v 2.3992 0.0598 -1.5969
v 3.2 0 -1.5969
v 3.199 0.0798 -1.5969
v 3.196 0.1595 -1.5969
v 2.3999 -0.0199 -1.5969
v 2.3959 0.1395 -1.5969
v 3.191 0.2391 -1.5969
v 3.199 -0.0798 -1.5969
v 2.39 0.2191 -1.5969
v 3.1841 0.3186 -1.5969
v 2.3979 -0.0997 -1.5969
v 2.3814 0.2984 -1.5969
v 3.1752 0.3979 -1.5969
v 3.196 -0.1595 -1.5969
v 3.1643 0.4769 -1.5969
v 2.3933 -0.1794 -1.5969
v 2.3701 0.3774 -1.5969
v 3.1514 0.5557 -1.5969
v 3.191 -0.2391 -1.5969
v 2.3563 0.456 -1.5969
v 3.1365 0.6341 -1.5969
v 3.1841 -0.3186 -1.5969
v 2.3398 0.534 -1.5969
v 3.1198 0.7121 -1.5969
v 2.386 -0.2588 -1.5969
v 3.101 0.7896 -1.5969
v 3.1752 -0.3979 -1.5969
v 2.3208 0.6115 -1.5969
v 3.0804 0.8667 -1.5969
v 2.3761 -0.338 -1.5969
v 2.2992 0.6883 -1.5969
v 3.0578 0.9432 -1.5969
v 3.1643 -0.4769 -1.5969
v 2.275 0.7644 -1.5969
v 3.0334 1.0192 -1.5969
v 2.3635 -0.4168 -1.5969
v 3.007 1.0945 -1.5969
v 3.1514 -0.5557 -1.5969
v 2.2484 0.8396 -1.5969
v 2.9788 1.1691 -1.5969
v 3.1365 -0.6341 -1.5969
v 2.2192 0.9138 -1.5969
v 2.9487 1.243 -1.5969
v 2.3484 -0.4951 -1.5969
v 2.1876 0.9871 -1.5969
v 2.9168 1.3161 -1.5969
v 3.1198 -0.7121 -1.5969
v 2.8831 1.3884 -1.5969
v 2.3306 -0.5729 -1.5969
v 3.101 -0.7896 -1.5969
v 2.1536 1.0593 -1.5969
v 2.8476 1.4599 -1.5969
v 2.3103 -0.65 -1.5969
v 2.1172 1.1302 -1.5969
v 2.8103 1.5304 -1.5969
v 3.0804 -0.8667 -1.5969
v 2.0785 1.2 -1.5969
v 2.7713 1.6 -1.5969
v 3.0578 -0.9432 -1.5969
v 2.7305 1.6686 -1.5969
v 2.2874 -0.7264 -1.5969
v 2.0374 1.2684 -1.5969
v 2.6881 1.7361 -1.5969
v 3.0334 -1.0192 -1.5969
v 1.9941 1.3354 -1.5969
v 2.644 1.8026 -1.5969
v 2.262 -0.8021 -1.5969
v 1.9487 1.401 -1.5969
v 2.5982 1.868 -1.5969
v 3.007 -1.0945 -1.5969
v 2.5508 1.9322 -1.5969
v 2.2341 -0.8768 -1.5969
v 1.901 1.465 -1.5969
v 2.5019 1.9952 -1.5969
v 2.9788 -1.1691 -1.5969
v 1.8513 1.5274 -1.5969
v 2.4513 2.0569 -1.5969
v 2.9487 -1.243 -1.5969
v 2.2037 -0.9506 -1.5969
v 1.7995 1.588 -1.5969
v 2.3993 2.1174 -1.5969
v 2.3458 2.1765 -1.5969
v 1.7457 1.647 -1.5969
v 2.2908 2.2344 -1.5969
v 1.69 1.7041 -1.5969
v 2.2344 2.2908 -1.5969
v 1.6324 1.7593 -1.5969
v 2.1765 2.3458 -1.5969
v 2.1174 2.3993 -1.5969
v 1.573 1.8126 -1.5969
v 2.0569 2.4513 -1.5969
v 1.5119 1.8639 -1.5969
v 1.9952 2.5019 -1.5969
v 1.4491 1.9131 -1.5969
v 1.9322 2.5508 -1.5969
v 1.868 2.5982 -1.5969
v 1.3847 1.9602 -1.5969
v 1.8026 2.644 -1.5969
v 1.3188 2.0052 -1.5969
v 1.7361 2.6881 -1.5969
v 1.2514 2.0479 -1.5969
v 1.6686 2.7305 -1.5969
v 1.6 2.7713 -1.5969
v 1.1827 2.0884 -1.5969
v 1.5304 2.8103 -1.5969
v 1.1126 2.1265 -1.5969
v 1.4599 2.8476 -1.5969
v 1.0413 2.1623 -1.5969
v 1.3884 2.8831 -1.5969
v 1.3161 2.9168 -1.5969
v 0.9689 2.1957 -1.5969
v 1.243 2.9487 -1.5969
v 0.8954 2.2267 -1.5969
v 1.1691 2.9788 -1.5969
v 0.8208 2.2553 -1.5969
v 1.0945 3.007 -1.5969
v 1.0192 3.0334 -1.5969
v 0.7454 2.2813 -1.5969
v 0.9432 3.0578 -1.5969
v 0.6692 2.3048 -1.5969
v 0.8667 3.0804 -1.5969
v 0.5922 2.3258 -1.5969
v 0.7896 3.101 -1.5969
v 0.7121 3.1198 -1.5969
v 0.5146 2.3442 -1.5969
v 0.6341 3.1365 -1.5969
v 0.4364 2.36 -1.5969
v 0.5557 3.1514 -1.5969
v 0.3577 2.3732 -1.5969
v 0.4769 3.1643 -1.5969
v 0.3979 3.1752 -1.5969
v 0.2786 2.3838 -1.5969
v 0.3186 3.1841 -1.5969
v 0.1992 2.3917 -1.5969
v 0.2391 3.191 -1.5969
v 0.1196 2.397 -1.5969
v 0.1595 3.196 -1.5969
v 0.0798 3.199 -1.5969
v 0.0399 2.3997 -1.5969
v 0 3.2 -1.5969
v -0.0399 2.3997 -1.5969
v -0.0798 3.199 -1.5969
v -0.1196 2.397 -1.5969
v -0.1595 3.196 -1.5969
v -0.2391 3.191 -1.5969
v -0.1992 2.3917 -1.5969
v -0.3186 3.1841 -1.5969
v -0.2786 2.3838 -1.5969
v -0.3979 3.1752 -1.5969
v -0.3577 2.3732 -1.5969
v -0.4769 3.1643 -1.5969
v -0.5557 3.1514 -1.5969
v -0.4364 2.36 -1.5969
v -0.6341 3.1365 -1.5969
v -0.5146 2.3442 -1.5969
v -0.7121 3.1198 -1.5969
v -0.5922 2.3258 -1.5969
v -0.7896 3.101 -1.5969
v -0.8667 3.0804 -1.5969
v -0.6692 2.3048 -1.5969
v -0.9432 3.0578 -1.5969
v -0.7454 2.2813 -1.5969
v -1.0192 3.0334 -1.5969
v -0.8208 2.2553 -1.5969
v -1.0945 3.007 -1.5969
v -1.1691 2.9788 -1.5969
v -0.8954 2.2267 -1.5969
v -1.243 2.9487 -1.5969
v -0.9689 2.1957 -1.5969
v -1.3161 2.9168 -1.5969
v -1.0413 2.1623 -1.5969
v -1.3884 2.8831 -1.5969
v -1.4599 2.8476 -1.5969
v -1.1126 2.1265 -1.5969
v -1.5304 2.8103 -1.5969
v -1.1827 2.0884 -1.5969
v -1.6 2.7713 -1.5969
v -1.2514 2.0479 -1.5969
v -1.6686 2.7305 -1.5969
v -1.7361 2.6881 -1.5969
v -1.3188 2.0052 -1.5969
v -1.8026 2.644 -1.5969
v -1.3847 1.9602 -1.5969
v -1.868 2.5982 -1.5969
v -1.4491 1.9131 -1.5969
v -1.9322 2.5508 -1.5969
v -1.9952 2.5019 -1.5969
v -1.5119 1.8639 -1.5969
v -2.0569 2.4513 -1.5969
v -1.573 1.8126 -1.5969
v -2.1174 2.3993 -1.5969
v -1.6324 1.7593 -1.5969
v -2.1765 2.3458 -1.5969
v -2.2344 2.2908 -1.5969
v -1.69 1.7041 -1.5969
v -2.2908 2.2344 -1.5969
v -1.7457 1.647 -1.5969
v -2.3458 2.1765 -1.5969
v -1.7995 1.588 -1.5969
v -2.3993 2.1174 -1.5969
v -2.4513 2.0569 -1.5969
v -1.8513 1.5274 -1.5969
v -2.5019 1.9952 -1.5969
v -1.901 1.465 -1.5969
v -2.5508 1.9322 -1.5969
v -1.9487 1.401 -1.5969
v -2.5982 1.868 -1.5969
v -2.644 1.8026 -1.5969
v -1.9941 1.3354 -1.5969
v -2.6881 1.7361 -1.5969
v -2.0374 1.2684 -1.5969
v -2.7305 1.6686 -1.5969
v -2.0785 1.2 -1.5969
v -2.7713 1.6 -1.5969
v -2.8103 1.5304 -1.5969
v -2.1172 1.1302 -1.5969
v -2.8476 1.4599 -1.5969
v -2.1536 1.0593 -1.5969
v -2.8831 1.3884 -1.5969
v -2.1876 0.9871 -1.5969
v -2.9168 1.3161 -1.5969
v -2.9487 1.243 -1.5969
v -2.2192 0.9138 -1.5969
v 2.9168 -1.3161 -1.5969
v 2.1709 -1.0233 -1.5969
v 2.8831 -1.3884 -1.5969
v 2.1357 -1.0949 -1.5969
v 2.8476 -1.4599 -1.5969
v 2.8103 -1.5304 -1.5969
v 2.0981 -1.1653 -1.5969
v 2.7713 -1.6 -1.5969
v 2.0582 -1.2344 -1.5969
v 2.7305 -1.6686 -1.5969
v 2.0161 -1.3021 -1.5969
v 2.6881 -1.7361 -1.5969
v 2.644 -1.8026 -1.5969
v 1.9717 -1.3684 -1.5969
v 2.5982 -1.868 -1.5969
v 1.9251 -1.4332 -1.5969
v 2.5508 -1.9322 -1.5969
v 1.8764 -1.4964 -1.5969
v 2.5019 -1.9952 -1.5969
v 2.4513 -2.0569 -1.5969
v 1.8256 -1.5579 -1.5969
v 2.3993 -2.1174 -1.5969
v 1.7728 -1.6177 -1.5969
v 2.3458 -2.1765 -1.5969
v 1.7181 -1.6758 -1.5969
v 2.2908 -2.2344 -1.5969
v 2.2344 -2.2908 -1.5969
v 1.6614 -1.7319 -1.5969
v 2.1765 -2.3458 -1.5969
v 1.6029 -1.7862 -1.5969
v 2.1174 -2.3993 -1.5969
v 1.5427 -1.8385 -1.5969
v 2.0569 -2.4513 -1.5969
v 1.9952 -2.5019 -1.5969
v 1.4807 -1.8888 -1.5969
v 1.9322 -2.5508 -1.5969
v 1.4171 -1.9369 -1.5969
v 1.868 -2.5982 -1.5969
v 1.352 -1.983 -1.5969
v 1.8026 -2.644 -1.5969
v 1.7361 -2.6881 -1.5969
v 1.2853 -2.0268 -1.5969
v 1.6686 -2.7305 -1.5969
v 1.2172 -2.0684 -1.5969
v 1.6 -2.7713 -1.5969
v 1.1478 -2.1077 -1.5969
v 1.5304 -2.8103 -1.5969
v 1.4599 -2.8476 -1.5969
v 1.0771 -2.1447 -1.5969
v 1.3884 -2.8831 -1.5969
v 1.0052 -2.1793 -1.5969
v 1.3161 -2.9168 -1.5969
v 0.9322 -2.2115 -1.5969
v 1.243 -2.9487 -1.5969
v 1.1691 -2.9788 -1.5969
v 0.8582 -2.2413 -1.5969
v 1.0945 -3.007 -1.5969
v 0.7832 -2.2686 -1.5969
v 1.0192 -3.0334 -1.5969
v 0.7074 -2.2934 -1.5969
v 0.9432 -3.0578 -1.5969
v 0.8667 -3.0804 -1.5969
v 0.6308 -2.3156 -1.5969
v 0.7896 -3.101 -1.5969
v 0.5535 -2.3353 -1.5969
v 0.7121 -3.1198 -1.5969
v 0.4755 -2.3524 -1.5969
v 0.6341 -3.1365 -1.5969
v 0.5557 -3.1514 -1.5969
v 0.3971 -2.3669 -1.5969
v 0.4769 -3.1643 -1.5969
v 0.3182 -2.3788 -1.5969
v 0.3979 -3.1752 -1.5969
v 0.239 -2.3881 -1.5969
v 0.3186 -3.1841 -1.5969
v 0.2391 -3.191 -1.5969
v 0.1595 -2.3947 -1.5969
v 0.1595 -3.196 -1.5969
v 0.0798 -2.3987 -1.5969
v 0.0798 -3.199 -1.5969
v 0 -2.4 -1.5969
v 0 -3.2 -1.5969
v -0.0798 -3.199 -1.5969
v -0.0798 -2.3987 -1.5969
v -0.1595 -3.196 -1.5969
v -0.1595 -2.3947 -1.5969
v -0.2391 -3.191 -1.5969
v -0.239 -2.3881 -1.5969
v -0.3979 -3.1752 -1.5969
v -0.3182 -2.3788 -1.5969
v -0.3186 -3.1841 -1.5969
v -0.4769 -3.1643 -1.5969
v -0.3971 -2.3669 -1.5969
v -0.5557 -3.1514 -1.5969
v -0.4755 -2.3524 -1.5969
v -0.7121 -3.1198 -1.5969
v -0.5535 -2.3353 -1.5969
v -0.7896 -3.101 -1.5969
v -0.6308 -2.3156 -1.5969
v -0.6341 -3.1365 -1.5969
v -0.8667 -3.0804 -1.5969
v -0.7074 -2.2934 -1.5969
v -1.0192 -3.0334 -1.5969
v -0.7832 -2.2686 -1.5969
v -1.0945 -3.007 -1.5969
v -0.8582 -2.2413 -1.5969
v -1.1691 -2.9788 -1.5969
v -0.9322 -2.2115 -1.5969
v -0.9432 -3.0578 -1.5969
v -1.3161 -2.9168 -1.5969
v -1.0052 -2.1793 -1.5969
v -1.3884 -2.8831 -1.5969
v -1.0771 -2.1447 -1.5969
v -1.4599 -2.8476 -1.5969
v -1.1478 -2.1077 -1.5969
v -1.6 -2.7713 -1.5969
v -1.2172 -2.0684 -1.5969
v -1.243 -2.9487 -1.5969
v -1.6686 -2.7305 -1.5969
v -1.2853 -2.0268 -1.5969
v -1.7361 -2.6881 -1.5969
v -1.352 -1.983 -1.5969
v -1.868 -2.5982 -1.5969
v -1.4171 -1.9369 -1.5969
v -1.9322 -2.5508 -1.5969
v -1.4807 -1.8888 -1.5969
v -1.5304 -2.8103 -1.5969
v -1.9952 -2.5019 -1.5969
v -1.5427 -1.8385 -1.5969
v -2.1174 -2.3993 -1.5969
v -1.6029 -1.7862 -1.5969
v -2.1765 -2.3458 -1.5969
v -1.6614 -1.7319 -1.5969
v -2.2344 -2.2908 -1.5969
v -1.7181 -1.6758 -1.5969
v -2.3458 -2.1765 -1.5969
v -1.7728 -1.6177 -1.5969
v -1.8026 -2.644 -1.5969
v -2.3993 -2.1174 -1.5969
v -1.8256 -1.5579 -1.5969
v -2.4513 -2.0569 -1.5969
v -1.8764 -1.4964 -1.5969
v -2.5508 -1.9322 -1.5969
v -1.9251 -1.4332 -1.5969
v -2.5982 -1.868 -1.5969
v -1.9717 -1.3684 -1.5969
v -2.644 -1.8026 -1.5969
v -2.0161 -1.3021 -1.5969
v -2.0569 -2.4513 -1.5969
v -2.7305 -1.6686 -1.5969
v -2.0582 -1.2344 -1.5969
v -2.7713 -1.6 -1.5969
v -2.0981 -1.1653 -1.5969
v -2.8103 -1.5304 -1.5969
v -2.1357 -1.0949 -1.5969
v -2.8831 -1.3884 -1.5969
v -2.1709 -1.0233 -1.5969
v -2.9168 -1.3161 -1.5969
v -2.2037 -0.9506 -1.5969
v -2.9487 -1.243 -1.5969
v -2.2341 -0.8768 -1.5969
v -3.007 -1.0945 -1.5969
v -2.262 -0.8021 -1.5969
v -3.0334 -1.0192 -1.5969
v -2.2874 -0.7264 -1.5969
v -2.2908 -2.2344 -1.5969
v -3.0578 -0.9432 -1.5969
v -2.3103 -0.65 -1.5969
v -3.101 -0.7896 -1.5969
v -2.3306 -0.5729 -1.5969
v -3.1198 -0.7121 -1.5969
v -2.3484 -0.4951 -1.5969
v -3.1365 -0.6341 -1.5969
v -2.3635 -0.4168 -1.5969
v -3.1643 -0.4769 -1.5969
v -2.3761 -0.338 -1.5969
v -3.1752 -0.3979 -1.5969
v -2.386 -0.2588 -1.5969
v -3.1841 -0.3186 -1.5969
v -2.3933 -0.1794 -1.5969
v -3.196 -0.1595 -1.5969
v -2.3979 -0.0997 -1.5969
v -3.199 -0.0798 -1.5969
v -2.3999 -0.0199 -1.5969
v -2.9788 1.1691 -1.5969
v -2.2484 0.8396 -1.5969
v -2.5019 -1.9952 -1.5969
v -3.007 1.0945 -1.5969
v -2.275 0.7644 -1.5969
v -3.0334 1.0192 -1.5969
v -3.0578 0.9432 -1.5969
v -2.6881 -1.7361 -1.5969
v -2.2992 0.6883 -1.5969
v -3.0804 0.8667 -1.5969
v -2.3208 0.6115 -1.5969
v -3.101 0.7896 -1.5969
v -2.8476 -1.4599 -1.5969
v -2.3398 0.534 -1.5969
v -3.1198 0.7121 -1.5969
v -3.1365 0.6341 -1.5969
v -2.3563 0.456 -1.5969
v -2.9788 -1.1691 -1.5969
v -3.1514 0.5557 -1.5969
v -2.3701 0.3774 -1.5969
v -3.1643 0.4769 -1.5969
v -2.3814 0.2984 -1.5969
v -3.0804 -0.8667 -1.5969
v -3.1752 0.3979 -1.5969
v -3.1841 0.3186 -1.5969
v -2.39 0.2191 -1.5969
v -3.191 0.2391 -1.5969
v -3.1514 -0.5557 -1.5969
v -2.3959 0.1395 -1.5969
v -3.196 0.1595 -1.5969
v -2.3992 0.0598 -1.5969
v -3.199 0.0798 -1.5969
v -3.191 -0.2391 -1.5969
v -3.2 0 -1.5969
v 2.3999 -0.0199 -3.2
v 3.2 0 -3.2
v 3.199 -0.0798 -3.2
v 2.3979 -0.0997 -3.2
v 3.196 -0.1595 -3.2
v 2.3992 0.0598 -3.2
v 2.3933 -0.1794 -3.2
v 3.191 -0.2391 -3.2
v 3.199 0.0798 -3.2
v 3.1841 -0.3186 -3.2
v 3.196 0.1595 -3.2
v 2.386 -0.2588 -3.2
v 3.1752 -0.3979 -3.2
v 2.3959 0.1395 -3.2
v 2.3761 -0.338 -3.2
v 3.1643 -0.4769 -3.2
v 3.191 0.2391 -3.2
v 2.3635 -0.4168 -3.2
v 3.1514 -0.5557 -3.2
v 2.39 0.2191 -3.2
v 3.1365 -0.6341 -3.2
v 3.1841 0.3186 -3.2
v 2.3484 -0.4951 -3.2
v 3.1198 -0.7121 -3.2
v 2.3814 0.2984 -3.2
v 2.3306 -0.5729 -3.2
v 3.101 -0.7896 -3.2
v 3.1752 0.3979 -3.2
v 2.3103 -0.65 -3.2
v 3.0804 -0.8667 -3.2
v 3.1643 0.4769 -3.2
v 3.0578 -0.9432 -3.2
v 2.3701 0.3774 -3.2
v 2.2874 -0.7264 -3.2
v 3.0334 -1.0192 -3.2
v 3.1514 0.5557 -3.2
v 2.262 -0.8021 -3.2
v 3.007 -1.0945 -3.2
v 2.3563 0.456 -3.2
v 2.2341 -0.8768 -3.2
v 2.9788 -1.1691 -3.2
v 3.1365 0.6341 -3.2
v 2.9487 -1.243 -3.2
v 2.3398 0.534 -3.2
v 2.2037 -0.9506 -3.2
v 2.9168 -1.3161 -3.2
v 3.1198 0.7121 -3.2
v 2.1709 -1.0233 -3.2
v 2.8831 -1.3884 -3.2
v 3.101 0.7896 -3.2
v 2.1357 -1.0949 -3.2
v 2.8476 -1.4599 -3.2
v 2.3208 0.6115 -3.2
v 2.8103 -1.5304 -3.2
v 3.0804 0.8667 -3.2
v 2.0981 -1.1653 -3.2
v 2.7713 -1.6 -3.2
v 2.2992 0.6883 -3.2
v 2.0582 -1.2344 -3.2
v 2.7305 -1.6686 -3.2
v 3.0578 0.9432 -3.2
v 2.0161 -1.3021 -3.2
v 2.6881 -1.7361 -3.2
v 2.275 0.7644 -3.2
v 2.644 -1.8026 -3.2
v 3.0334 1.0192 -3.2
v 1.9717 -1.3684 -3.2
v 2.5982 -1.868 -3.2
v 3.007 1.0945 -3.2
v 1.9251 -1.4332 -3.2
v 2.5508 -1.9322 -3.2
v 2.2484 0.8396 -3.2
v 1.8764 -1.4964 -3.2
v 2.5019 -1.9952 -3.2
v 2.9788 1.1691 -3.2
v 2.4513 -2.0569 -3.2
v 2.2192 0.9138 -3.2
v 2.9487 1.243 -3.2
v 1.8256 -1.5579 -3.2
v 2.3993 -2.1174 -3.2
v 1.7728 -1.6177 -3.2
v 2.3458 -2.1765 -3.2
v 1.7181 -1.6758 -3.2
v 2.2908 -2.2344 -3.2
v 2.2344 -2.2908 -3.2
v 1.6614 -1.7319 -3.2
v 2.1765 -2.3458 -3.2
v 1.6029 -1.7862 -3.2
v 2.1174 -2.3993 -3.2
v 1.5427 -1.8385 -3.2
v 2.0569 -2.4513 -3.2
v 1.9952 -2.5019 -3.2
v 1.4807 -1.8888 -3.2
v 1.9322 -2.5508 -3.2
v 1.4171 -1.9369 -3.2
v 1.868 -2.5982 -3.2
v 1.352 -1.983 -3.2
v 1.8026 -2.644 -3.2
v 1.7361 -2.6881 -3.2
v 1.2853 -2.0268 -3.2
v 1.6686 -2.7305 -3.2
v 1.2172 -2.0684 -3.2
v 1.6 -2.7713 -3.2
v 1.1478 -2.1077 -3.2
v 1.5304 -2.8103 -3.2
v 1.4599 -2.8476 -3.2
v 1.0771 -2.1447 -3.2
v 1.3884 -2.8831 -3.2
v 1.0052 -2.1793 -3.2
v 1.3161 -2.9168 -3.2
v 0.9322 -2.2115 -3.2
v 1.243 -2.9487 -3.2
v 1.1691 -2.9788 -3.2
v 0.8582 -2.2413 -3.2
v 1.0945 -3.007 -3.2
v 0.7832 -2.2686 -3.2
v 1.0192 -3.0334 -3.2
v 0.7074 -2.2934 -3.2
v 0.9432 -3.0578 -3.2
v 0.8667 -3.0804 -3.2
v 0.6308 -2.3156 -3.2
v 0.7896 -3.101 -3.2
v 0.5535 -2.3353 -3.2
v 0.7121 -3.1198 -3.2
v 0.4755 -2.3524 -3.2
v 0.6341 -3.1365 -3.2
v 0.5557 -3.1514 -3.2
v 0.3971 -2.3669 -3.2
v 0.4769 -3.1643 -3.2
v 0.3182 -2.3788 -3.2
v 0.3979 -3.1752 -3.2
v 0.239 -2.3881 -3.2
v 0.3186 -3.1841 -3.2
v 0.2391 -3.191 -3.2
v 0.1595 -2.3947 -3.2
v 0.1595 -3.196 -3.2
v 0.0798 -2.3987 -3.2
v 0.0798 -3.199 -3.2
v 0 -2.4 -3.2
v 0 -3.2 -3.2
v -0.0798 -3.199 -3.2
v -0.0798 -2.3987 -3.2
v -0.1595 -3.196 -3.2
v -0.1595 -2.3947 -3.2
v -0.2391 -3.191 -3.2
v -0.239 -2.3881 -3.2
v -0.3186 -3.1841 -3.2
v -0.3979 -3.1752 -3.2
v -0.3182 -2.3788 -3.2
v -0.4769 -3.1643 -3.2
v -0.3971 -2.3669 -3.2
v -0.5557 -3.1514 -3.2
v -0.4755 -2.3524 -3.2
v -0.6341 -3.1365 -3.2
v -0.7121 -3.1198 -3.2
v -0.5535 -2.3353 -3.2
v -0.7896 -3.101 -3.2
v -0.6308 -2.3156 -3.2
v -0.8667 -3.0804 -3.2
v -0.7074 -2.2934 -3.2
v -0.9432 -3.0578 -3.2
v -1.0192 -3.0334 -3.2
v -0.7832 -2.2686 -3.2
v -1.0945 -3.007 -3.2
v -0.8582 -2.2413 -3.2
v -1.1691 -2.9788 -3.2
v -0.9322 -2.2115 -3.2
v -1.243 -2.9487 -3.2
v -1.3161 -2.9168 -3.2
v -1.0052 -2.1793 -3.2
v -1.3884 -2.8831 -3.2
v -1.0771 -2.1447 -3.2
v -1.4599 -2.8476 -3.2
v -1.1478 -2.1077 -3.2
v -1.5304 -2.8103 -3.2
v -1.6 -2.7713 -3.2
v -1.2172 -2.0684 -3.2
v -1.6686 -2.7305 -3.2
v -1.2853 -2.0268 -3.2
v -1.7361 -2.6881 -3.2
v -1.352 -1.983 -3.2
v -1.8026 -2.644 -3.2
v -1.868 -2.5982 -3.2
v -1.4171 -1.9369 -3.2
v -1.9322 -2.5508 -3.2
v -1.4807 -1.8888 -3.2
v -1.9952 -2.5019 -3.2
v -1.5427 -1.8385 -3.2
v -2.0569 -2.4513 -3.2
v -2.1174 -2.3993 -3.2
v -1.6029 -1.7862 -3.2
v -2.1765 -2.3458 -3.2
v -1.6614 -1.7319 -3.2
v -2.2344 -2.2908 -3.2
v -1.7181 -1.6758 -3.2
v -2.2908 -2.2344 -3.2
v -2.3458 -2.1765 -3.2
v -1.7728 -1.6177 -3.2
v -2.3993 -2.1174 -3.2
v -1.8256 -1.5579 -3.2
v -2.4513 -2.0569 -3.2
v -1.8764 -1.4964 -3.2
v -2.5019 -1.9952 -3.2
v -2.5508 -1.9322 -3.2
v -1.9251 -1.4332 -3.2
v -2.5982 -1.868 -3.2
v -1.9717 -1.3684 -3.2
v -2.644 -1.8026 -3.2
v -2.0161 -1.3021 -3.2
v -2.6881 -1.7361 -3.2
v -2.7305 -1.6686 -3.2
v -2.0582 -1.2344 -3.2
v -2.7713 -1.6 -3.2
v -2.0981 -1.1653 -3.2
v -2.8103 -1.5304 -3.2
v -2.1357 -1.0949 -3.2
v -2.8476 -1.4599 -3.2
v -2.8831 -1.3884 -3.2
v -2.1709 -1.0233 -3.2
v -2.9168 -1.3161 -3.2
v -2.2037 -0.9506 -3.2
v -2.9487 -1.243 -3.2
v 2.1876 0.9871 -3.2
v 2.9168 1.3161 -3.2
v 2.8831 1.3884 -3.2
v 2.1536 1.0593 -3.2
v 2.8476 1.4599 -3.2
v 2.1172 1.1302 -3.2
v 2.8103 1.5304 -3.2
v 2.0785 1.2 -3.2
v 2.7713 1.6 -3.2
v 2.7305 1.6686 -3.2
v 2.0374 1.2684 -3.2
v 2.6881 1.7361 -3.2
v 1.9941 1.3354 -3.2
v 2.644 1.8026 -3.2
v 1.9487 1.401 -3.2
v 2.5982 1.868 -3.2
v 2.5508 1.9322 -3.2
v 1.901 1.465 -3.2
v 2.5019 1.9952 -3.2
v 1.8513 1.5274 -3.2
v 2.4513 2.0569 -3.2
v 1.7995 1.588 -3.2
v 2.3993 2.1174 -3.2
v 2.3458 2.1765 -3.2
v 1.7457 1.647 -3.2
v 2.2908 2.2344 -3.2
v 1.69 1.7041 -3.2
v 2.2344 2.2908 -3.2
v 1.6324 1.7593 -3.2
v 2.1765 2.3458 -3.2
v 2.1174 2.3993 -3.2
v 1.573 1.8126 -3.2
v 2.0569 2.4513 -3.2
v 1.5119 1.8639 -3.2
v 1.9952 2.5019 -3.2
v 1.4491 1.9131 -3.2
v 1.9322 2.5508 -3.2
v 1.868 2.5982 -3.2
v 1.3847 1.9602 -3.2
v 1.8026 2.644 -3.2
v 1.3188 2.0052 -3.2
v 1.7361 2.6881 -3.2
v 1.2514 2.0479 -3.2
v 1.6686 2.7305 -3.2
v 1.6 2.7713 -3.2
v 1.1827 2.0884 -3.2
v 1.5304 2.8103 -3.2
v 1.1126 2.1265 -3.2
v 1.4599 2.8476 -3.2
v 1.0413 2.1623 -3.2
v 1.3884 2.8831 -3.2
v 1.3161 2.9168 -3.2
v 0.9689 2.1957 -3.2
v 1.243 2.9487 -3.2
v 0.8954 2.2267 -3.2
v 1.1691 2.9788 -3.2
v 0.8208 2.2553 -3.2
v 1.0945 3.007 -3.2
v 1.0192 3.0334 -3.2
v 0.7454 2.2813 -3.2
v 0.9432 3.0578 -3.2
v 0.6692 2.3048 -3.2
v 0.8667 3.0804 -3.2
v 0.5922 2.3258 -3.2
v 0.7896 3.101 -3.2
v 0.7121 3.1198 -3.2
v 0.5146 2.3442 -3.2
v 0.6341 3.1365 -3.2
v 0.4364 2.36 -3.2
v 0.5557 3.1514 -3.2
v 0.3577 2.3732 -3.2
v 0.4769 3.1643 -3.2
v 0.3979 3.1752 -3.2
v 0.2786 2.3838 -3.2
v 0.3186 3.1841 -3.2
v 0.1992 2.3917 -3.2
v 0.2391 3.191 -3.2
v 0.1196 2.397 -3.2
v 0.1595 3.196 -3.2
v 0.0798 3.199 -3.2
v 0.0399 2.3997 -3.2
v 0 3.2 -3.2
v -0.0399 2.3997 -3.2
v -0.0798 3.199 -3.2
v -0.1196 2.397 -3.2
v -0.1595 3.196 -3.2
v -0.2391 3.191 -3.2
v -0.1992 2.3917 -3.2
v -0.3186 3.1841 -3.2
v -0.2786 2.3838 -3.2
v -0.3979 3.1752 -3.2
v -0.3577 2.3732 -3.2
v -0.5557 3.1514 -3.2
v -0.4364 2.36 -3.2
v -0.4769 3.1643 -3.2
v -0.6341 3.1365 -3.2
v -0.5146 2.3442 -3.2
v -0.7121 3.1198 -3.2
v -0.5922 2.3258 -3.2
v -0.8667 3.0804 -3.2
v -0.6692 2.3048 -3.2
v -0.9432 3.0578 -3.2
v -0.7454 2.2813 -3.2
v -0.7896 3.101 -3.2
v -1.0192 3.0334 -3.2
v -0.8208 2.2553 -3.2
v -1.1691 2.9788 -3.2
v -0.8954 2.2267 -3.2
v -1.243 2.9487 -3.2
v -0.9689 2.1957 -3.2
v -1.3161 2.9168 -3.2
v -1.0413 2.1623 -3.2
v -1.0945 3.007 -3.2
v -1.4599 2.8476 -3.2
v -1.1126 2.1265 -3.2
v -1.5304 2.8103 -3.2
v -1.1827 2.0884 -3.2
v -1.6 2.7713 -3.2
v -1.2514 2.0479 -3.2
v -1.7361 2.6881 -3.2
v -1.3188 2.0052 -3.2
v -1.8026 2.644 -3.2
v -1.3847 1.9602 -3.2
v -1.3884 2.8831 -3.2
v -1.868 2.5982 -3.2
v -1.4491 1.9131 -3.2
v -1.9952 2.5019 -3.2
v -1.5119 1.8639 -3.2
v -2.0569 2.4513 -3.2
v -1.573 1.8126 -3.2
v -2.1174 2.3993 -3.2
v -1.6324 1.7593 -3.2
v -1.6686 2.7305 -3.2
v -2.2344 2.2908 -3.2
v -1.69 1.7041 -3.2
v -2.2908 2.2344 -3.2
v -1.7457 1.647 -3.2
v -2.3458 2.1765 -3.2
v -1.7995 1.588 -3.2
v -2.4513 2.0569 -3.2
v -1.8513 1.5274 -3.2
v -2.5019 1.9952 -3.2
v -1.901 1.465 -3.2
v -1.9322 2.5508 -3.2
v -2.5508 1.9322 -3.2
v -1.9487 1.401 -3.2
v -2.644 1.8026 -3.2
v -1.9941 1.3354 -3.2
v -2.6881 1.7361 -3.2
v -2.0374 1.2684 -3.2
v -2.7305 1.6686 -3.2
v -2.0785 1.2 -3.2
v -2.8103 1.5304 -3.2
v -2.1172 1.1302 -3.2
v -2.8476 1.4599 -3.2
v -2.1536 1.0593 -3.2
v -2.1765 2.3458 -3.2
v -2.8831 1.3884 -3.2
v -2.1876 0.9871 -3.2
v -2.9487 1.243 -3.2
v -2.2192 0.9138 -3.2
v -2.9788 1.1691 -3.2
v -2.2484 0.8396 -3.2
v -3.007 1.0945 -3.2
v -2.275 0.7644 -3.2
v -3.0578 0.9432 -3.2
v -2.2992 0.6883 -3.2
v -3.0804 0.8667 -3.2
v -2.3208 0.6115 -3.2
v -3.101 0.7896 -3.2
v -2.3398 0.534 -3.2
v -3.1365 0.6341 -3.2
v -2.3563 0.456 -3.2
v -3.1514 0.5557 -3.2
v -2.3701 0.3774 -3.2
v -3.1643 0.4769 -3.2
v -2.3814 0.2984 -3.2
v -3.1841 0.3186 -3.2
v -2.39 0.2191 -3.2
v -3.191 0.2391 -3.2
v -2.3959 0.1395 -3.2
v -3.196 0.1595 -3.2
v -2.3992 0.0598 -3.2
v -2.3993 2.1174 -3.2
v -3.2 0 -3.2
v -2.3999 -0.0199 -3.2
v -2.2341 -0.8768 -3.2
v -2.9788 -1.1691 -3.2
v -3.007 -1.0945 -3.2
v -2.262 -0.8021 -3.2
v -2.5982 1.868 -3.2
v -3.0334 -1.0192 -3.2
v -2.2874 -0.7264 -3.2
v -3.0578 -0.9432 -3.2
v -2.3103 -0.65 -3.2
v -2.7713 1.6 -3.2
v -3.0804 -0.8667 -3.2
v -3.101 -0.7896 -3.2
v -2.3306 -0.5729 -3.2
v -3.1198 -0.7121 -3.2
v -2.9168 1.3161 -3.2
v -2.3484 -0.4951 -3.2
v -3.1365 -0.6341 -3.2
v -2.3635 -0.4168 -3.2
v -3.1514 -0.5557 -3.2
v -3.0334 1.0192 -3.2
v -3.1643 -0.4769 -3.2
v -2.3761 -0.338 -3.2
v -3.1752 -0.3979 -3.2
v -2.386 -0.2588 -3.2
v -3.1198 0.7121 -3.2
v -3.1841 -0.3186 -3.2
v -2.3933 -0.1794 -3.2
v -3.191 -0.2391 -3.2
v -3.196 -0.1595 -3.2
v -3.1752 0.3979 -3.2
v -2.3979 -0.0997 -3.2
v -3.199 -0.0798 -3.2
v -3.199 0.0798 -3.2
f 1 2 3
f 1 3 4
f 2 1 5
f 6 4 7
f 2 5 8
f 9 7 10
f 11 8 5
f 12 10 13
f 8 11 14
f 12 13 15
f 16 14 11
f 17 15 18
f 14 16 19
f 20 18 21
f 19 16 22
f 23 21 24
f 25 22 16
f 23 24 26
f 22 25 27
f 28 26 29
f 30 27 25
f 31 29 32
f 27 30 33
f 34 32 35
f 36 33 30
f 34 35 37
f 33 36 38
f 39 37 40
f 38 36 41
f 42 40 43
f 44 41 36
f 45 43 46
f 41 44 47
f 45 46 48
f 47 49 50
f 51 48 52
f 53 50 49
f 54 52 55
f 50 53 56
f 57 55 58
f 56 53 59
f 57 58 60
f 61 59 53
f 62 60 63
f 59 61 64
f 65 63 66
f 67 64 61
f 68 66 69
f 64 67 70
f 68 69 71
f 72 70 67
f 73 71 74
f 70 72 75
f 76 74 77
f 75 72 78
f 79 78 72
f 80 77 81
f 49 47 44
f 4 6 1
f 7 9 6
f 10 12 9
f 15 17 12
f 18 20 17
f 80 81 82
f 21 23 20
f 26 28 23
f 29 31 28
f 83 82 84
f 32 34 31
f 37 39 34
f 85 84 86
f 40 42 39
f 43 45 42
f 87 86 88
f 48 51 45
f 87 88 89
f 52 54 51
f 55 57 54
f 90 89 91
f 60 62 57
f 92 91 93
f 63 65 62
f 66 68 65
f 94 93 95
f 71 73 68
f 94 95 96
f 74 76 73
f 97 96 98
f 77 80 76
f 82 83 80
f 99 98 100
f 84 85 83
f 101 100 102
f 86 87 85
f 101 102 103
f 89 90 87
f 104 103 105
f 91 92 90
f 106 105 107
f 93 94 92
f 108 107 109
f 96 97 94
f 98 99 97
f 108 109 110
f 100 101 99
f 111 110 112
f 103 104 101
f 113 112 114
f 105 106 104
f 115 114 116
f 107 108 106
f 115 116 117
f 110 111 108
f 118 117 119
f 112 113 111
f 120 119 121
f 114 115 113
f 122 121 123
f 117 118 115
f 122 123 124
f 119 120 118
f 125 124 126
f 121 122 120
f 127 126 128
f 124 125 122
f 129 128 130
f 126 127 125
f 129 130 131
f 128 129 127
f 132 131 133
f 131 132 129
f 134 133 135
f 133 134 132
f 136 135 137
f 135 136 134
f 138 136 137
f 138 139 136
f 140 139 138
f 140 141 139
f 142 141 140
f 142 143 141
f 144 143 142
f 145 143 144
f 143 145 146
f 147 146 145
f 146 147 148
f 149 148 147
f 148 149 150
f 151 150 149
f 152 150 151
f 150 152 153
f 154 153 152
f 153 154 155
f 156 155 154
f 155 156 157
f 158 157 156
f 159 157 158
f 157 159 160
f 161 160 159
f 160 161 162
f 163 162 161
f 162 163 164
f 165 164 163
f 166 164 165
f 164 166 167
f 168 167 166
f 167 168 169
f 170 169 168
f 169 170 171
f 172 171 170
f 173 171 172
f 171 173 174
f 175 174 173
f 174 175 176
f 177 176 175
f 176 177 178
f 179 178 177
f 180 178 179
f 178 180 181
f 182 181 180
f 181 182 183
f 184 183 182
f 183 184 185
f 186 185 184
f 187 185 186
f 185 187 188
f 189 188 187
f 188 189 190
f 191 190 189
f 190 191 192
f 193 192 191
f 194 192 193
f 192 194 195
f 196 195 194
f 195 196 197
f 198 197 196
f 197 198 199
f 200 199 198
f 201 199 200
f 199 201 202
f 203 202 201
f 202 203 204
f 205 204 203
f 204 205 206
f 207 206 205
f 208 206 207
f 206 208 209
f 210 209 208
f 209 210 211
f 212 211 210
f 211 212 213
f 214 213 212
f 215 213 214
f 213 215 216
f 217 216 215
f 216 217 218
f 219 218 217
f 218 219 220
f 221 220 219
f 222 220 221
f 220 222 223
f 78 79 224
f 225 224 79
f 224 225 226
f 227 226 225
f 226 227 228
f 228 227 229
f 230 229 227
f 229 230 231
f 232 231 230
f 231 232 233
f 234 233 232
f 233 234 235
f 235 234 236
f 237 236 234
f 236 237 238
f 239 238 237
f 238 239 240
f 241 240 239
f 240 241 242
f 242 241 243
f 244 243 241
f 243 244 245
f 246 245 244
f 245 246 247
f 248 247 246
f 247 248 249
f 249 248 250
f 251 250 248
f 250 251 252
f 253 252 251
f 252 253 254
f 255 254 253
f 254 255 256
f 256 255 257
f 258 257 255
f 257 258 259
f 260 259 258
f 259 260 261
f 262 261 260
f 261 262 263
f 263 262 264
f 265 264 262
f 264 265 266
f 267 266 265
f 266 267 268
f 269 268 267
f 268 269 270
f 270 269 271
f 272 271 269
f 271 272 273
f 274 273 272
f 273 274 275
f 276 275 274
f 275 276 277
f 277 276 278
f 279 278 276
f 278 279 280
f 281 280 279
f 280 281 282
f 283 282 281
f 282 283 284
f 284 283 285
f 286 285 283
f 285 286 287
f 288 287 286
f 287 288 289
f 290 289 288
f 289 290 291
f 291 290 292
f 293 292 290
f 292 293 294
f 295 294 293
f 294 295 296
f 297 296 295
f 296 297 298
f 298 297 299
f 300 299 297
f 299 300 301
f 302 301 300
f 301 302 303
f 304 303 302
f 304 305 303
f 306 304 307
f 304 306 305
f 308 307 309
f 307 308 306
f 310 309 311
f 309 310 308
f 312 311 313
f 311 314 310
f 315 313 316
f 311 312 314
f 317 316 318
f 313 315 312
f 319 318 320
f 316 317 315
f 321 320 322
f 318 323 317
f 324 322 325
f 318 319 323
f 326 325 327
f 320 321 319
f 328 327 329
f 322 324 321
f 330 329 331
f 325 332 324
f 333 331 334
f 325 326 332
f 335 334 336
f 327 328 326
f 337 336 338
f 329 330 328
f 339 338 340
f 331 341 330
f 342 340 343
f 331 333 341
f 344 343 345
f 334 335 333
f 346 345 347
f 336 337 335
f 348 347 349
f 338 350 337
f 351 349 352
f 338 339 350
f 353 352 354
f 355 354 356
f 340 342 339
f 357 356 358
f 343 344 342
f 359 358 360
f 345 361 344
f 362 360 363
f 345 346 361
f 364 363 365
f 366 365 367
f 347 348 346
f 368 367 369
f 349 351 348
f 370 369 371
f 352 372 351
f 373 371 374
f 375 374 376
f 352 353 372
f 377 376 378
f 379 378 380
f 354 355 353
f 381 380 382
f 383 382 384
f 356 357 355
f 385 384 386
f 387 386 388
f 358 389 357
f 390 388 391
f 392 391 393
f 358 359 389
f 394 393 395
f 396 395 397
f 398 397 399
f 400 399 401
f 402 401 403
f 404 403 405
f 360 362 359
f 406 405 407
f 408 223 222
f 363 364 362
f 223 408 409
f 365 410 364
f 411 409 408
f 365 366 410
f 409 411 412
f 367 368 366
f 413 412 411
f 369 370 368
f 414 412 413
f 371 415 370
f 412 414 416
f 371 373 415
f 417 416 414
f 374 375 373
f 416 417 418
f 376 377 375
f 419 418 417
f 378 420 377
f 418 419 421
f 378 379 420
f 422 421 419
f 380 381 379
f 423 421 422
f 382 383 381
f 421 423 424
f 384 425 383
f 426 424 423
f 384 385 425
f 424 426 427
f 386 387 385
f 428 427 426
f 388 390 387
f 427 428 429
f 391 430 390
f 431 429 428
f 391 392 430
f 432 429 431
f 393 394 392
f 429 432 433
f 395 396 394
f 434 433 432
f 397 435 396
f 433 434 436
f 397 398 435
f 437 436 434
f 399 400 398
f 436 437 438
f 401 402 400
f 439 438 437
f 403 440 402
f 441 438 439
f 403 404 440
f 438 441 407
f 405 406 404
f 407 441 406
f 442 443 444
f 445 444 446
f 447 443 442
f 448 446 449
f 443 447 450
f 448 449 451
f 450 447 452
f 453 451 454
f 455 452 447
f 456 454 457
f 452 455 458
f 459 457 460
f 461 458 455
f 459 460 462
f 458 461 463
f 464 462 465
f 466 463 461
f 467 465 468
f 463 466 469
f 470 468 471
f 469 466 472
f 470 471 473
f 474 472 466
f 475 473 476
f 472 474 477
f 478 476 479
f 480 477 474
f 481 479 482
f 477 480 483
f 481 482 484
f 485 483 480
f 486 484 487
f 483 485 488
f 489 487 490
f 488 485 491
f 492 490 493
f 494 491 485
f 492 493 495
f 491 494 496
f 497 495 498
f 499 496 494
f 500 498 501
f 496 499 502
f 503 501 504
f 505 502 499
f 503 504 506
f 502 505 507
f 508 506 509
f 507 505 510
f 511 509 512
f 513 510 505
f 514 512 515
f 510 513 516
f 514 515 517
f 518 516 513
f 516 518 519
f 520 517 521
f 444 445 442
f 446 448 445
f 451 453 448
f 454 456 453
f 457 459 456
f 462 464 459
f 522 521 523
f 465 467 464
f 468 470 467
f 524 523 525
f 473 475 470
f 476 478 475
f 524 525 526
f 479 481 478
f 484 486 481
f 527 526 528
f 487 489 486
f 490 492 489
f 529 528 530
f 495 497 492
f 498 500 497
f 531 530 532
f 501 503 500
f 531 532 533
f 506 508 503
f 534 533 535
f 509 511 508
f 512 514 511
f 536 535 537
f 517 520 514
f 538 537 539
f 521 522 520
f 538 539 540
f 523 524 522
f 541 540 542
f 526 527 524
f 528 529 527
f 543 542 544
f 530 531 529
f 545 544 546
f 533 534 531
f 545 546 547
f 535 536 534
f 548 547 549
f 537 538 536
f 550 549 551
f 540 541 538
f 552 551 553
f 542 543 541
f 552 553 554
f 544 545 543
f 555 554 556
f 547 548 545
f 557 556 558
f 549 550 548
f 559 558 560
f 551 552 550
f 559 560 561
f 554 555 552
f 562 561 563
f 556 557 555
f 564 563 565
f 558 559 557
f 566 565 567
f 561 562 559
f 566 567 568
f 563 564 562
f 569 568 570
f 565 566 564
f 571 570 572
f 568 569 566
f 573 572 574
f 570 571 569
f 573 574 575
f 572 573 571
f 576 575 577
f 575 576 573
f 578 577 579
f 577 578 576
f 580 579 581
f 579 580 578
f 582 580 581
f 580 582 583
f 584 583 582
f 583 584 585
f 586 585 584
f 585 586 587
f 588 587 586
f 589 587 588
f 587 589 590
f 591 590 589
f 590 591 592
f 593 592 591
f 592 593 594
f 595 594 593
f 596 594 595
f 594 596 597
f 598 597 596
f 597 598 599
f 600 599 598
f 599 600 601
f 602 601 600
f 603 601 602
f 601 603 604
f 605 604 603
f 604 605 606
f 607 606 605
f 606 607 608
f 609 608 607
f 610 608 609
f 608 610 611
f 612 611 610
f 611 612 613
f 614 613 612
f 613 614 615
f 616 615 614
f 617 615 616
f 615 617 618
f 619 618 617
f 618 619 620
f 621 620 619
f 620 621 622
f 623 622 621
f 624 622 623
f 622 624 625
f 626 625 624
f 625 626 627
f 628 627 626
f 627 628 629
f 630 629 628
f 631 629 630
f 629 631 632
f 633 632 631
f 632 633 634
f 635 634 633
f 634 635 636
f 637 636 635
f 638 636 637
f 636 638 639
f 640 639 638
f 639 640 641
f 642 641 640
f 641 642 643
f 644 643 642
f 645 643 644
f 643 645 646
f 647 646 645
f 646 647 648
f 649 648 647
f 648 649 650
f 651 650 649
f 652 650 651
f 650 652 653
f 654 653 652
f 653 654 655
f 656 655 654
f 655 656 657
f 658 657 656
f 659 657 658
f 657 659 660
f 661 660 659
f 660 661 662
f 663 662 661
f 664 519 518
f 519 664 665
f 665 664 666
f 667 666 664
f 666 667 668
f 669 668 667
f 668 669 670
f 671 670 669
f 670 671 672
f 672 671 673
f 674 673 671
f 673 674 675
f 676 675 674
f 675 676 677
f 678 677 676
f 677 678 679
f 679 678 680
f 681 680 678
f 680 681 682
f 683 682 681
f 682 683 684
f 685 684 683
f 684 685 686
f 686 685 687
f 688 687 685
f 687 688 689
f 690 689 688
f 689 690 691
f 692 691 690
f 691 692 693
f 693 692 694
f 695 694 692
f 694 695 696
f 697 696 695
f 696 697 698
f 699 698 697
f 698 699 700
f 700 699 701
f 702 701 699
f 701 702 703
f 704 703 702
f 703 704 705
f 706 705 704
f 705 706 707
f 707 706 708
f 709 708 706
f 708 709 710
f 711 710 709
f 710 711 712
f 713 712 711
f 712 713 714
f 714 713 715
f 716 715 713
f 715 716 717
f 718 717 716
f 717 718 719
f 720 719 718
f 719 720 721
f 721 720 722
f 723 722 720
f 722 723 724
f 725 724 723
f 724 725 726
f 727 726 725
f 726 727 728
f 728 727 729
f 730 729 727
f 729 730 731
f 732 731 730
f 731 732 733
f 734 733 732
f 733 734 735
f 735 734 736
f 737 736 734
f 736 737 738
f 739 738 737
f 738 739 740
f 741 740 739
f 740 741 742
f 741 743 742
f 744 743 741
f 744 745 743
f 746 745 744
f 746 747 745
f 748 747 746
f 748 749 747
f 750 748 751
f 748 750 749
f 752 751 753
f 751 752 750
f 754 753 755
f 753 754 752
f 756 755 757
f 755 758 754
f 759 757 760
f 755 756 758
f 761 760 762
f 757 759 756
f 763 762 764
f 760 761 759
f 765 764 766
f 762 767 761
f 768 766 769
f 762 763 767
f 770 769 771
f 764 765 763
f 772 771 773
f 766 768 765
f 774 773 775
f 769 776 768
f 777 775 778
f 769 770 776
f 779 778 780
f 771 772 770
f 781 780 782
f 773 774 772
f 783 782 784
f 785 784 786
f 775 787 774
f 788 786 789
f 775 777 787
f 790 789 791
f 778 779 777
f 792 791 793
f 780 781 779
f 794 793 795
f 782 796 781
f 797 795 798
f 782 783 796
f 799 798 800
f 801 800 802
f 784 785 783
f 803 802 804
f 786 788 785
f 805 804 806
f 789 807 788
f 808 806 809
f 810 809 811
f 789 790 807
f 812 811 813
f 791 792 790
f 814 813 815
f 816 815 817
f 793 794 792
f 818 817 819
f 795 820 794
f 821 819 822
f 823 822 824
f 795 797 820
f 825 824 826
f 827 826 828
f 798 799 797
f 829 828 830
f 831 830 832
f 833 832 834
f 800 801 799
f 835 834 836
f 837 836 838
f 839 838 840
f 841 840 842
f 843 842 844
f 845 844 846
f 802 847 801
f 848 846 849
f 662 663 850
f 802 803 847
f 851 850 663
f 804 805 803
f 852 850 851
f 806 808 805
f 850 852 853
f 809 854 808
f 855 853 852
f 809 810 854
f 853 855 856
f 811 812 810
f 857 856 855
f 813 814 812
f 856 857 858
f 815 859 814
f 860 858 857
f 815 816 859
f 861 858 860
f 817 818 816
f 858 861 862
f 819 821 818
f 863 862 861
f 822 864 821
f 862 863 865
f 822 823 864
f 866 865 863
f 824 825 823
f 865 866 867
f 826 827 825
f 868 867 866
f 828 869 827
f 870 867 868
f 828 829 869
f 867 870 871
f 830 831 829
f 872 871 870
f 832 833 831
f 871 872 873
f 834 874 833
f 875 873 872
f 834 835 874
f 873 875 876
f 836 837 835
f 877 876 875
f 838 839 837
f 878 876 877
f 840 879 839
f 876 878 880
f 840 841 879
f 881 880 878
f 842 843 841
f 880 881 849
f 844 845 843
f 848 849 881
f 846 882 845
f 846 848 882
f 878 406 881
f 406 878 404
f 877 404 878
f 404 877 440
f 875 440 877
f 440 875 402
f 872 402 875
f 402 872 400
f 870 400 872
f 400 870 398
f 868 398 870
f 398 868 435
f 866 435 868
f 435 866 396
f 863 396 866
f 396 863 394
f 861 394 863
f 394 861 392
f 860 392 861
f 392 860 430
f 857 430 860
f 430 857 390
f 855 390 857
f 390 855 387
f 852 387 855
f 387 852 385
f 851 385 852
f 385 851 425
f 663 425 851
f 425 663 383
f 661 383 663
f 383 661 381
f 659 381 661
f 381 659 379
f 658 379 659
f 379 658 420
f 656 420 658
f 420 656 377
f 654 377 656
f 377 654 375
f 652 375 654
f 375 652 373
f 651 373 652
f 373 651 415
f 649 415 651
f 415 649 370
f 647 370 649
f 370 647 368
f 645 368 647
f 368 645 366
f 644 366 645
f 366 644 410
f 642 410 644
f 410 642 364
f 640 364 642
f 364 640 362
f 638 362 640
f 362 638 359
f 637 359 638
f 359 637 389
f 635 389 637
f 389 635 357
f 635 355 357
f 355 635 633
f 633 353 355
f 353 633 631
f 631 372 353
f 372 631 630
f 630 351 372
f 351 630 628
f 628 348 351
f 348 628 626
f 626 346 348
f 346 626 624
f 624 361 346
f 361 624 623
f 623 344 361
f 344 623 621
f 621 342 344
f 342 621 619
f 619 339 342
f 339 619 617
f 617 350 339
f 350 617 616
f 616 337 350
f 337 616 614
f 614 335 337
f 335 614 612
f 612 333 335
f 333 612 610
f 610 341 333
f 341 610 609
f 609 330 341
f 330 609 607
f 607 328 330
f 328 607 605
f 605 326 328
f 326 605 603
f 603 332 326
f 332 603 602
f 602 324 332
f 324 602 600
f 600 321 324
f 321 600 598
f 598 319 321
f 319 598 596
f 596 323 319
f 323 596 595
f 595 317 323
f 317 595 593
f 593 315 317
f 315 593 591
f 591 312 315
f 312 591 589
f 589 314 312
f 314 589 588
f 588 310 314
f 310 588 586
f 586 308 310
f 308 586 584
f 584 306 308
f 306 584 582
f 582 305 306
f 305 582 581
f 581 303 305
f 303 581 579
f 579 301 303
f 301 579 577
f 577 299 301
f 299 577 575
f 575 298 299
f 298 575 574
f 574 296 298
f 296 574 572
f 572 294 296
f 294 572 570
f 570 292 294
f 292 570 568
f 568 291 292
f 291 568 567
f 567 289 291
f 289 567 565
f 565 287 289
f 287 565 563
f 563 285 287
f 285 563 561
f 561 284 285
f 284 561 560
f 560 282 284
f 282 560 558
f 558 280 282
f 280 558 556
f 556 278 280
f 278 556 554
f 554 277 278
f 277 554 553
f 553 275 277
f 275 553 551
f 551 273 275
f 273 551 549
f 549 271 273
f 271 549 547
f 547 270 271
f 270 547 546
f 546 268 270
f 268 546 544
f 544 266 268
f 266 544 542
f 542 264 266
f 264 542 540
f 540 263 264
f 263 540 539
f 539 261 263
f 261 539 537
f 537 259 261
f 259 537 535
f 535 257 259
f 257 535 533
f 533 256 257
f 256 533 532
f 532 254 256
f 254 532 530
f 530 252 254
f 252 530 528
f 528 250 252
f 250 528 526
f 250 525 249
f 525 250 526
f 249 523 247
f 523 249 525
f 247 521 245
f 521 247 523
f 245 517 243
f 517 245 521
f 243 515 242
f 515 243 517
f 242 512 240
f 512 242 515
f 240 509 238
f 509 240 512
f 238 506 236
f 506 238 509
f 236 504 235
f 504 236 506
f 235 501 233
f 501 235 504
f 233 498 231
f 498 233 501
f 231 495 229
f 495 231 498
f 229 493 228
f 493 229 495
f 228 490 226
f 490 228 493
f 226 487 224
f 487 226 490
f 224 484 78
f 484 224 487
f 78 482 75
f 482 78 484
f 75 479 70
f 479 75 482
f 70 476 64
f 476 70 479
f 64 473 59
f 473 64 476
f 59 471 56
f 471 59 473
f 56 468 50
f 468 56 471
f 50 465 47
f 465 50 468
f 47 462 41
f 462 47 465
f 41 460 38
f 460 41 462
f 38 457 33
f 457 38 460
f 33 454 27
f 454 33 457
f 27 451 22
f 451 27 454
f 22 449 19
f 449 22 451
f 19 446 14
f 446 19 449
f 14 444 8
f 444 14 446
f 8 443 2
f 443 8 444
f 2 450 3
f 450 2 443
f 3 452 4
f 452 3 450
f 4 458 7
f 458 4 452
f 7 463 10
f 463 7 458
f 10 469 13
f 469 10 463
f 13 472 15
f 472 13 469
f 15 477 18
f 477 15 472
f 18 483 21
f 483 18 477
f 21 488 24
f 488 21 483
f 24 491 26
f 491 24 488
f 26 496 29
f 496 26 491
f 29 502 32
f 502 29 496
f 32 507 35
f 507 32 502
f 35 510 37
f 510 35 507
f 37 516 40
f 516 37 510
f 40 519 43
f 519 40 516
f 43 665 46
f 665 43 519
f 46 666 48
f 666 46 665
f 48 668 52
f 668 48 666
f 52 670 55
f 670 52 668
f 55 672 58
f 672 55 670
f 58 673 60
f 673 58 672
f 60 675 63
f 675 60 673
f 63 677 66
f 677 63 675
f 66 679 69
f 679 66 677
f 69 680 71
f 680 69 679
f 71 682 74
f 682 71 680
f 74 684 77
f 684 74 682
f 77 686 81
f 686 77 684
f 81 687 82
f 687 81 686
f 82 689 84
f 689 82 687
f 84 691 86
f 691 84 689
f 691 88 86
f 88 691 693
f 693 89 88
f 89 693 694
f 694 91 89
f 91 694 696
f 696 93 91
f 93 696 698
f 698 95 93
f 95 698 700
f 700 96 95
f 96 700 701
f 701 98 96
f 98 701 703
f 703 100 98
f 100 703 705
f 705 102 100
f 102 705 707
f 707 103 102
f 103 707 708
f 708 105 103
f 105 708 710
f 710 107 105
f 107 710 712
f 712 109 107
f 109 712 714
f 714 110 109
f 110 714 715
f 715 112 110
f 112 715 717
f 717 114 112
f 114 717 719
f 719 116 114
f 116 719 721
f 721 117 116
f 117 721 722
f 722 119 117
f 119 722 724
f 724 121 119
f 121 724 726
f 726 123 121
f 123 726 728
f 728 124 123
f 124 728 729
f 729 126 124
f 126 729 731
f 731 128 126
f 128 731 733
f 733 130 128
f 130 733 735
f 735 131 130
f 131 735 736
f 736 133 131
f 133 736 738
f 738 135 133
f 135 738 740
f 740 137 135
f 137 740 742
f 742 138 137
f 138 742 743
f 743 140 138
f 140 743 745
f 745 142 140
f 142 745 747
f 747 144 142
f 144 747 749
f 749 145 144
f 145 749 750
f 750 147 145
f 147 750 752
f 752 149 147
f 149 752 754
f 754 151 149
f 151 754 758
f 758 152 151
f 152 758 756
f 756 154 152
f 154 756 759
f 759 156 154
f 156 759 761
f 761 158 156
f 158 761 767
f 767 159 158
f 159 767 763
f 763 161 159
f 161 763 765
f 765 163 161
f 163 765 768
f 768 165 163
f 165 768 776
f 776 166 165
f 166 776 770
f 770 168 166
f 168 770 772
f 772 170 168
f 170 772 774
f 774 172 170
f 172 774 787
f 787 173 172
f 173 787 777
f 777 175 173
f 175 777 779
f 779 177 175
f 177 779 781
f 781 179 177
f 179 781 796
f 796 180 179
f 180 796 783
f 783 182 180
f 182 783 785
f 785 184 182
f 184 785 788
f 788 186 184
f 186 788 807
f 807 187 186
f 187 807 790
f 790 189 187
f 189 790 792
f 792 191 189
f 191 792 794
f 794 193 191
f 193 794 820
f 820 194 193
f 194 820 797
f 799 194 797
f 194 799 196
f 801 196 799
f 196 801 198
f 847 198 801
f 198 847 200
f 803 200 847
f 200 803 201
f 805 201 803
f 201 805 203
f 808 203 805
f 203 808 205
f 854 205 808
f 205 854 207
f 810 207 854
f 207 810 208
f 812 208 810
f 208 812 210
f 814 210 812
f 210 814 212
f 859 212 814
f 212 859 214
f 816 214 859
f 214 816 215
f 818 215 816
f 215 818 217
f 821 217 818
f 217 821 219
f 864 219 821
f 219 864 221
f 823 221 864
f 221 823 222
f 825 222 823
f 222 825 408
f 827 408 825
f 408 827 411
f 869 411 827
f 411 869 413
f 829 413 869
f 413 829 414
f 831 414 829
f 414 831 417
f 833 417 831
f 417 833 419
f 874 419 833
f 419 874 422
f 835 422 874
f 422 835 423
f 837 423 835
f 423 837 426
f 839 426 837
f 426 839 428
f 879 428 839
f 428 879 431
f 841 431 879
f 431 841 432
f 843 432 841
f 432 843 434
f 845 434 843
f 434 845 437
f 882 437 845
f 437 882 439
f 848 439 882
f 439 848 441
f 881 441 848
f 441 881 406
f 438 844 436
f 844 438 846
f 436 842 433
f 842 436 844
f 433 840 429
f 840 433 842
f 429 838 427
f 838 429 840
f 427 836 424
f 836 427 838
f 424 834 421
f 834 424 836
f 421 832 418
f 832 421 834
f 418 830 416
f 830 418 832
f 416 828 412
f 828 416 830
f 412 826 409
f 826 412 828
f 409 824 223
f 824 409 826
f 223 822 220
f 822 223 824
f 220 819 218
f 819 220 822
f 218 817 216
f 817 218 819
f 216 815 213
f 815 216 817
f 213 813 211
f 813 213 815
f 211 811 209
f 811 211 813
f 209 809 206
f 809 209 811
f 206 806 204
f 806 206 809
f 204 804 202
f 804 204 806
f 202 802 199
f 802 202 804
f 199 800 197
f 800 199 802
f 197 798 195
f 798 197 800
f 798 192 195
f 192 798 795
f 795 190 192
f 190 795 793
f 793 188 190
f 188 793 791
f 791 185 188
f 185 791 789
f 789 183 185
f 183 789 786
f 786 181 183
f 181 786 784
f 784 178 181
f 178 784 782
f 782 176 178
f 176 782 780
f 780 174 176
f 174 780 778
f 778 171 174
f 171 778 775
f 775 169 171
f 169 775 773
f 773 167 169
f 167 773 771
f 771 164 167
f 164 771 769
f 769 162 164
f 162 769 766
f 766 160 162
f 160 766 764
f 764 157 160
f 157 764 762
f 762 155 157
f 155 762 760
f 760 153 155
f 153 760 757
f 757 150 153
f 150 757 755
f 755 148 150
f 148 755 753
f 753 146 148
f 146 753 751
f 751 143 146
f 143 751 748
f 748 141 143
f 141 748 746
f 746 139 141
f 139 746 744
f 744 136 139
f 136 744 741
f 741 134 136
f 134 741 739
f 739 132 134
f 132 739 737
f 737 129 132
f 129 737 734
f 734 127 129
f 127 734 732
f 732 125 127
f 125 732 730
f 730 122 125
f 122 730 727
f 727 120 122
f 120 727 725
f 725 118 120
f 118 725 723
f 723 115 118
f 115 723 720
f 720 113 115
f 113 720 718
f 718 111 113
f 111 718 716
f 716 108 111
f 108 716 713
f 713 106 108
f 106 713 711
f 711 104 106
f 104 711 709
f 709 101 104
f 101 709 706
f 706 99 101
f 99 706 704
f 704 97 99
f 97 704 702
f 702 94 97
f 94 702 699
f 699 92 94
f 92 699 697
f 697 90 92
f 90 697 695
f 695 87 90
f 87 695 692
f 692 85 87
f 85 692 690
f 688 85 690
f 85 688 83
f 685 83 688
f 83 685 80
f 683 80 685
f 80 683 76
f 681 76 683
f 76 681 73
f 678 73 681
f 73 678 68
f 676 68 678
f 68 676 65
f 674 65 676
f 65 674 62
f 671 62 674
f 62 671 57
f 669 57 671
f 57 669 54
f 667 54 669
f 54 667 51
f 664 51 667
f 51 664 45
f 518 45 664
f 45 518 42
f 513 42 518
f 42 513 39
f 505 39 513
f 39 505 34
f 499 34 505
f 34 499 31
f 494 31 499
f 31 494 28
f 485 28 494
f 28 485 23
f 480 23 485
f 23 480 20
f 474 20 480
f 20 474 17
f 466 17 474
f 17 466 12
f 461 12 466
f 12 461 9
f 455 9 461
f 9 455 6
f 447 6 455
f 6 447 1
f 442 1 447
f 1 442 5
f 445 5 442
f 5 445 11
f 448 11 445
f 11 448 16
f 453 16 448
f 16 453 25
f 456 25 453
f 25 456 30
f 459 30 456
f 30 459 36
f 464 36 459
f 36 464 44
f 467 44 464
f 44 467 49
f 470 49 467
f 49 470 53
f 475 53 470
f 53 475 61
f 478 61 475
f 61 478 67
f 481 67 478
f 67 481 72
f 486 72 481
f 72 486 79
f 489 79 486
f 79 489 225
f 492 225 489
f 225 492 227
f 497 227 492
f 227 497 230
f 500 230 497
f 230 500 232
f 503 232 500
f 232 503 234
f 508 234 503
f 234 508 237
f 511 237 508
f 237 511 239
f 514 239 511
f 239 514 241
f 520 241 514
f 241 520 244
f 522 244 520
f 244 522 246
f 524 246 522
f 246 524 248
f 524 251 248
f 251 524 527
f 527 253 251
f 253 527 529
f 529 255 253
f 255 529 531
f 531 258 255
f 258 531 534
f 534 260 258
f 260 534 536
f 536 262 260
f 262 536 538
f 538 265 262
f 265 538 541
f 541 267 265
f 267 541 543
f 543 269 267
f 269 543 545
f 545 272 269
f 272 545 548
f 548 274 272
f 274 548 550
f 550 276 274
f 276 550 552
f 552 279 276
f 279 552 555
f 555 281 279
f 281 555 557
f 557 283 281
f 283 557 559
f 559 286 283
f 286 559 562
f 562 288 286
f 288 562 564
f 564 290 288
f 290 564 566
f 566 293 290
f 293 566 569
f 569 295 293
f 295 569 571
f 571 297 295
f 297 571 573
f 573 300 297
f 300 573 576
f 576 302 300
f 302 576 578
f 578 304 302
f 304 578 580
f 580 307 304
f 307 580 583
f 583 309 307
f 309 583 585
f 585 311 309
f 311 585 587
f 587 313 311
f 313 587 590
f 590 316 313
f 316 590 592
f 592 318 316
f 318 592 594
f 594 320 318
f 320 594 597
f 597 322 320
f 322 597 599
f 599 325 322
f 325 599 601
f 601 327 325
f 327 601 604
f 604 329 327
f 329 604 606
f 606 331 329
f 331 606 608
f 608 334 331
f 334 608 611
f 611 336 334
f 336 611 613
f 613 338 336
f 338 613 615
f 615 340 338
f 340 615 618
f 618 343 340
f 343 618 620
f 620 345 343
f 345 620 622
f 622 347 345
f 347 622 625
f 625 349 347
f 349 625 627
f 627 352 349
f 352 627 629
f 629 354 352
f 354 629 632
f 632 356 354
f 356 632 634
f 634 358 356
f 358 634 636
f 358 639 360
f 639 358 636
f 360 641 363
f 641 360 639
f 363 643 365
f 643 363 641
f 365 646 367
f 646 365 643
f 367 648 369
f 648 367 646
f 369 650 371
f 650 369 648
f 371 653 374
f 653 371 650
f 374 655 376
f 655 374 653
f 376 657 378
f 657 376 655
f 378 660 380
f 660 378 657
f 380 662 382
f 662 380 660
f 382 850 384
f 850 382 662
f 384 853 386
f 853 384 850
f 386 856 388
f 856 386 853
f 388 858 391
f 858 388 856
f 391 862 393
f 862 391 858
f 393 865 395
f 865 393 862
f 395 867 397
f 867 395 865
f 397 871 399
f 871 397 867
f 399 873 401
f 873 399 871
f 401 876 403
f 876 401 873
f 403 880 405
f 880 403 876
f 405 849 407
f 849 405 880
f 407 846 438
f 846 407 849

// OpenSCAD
use <../lib.scad>
use <3068bp57.scad>
$fa=1; $fs=0.2;
function ldraw_lib__3068p57(realsolid=false) = [
// 0 ~Moved to 3068bp57
// 0 Name: 3068p57.dat
// 0 Author: [PTadmin]
// 0 !LDRAW_ORG Part UPDATE 2004-02
// 0 !LICENSE Licensed under CC BY 4.0 : see CAreadme.txt
// 
// 0 BFC CERTIFY CCW
  [0,"BFC","CERTIFY"],
  [0,"BFC","CCW"],
// 
// 0 !HISTORY 1997-09-29 [PTadmin] Official Update 1997-15
// 0 !HISTORY 2004-04-22 [PTadmin] Official Update 2004-02
// 0 !HISTORY 2007-06-13 [PTadmin] Header formatted for Contributor Agreement
// 0 !HISTORY 2008-07-01 [PTadmin] Official Update 2008-01
// 
// 
// 1 16 0 0 0 1 0 0 0 1 0 0 0 1 3068bp57.dat
  [1,16,0,0,0,1,0,0,0,1,0,0,0,1, ldraw_lib__3068bp57(realsolid)],
];
module ldraw_lib__3068p57(step=0, col=false, unit=2/5, alt=false, line=0.2, solid=!$preview)
    makepoly(ldraw_lib__3068p57(solid), step=step, col=col, unit=unit, alt=alt, line=line, solid=solid);
ldraw_lib__3068p57(line=0.2);
